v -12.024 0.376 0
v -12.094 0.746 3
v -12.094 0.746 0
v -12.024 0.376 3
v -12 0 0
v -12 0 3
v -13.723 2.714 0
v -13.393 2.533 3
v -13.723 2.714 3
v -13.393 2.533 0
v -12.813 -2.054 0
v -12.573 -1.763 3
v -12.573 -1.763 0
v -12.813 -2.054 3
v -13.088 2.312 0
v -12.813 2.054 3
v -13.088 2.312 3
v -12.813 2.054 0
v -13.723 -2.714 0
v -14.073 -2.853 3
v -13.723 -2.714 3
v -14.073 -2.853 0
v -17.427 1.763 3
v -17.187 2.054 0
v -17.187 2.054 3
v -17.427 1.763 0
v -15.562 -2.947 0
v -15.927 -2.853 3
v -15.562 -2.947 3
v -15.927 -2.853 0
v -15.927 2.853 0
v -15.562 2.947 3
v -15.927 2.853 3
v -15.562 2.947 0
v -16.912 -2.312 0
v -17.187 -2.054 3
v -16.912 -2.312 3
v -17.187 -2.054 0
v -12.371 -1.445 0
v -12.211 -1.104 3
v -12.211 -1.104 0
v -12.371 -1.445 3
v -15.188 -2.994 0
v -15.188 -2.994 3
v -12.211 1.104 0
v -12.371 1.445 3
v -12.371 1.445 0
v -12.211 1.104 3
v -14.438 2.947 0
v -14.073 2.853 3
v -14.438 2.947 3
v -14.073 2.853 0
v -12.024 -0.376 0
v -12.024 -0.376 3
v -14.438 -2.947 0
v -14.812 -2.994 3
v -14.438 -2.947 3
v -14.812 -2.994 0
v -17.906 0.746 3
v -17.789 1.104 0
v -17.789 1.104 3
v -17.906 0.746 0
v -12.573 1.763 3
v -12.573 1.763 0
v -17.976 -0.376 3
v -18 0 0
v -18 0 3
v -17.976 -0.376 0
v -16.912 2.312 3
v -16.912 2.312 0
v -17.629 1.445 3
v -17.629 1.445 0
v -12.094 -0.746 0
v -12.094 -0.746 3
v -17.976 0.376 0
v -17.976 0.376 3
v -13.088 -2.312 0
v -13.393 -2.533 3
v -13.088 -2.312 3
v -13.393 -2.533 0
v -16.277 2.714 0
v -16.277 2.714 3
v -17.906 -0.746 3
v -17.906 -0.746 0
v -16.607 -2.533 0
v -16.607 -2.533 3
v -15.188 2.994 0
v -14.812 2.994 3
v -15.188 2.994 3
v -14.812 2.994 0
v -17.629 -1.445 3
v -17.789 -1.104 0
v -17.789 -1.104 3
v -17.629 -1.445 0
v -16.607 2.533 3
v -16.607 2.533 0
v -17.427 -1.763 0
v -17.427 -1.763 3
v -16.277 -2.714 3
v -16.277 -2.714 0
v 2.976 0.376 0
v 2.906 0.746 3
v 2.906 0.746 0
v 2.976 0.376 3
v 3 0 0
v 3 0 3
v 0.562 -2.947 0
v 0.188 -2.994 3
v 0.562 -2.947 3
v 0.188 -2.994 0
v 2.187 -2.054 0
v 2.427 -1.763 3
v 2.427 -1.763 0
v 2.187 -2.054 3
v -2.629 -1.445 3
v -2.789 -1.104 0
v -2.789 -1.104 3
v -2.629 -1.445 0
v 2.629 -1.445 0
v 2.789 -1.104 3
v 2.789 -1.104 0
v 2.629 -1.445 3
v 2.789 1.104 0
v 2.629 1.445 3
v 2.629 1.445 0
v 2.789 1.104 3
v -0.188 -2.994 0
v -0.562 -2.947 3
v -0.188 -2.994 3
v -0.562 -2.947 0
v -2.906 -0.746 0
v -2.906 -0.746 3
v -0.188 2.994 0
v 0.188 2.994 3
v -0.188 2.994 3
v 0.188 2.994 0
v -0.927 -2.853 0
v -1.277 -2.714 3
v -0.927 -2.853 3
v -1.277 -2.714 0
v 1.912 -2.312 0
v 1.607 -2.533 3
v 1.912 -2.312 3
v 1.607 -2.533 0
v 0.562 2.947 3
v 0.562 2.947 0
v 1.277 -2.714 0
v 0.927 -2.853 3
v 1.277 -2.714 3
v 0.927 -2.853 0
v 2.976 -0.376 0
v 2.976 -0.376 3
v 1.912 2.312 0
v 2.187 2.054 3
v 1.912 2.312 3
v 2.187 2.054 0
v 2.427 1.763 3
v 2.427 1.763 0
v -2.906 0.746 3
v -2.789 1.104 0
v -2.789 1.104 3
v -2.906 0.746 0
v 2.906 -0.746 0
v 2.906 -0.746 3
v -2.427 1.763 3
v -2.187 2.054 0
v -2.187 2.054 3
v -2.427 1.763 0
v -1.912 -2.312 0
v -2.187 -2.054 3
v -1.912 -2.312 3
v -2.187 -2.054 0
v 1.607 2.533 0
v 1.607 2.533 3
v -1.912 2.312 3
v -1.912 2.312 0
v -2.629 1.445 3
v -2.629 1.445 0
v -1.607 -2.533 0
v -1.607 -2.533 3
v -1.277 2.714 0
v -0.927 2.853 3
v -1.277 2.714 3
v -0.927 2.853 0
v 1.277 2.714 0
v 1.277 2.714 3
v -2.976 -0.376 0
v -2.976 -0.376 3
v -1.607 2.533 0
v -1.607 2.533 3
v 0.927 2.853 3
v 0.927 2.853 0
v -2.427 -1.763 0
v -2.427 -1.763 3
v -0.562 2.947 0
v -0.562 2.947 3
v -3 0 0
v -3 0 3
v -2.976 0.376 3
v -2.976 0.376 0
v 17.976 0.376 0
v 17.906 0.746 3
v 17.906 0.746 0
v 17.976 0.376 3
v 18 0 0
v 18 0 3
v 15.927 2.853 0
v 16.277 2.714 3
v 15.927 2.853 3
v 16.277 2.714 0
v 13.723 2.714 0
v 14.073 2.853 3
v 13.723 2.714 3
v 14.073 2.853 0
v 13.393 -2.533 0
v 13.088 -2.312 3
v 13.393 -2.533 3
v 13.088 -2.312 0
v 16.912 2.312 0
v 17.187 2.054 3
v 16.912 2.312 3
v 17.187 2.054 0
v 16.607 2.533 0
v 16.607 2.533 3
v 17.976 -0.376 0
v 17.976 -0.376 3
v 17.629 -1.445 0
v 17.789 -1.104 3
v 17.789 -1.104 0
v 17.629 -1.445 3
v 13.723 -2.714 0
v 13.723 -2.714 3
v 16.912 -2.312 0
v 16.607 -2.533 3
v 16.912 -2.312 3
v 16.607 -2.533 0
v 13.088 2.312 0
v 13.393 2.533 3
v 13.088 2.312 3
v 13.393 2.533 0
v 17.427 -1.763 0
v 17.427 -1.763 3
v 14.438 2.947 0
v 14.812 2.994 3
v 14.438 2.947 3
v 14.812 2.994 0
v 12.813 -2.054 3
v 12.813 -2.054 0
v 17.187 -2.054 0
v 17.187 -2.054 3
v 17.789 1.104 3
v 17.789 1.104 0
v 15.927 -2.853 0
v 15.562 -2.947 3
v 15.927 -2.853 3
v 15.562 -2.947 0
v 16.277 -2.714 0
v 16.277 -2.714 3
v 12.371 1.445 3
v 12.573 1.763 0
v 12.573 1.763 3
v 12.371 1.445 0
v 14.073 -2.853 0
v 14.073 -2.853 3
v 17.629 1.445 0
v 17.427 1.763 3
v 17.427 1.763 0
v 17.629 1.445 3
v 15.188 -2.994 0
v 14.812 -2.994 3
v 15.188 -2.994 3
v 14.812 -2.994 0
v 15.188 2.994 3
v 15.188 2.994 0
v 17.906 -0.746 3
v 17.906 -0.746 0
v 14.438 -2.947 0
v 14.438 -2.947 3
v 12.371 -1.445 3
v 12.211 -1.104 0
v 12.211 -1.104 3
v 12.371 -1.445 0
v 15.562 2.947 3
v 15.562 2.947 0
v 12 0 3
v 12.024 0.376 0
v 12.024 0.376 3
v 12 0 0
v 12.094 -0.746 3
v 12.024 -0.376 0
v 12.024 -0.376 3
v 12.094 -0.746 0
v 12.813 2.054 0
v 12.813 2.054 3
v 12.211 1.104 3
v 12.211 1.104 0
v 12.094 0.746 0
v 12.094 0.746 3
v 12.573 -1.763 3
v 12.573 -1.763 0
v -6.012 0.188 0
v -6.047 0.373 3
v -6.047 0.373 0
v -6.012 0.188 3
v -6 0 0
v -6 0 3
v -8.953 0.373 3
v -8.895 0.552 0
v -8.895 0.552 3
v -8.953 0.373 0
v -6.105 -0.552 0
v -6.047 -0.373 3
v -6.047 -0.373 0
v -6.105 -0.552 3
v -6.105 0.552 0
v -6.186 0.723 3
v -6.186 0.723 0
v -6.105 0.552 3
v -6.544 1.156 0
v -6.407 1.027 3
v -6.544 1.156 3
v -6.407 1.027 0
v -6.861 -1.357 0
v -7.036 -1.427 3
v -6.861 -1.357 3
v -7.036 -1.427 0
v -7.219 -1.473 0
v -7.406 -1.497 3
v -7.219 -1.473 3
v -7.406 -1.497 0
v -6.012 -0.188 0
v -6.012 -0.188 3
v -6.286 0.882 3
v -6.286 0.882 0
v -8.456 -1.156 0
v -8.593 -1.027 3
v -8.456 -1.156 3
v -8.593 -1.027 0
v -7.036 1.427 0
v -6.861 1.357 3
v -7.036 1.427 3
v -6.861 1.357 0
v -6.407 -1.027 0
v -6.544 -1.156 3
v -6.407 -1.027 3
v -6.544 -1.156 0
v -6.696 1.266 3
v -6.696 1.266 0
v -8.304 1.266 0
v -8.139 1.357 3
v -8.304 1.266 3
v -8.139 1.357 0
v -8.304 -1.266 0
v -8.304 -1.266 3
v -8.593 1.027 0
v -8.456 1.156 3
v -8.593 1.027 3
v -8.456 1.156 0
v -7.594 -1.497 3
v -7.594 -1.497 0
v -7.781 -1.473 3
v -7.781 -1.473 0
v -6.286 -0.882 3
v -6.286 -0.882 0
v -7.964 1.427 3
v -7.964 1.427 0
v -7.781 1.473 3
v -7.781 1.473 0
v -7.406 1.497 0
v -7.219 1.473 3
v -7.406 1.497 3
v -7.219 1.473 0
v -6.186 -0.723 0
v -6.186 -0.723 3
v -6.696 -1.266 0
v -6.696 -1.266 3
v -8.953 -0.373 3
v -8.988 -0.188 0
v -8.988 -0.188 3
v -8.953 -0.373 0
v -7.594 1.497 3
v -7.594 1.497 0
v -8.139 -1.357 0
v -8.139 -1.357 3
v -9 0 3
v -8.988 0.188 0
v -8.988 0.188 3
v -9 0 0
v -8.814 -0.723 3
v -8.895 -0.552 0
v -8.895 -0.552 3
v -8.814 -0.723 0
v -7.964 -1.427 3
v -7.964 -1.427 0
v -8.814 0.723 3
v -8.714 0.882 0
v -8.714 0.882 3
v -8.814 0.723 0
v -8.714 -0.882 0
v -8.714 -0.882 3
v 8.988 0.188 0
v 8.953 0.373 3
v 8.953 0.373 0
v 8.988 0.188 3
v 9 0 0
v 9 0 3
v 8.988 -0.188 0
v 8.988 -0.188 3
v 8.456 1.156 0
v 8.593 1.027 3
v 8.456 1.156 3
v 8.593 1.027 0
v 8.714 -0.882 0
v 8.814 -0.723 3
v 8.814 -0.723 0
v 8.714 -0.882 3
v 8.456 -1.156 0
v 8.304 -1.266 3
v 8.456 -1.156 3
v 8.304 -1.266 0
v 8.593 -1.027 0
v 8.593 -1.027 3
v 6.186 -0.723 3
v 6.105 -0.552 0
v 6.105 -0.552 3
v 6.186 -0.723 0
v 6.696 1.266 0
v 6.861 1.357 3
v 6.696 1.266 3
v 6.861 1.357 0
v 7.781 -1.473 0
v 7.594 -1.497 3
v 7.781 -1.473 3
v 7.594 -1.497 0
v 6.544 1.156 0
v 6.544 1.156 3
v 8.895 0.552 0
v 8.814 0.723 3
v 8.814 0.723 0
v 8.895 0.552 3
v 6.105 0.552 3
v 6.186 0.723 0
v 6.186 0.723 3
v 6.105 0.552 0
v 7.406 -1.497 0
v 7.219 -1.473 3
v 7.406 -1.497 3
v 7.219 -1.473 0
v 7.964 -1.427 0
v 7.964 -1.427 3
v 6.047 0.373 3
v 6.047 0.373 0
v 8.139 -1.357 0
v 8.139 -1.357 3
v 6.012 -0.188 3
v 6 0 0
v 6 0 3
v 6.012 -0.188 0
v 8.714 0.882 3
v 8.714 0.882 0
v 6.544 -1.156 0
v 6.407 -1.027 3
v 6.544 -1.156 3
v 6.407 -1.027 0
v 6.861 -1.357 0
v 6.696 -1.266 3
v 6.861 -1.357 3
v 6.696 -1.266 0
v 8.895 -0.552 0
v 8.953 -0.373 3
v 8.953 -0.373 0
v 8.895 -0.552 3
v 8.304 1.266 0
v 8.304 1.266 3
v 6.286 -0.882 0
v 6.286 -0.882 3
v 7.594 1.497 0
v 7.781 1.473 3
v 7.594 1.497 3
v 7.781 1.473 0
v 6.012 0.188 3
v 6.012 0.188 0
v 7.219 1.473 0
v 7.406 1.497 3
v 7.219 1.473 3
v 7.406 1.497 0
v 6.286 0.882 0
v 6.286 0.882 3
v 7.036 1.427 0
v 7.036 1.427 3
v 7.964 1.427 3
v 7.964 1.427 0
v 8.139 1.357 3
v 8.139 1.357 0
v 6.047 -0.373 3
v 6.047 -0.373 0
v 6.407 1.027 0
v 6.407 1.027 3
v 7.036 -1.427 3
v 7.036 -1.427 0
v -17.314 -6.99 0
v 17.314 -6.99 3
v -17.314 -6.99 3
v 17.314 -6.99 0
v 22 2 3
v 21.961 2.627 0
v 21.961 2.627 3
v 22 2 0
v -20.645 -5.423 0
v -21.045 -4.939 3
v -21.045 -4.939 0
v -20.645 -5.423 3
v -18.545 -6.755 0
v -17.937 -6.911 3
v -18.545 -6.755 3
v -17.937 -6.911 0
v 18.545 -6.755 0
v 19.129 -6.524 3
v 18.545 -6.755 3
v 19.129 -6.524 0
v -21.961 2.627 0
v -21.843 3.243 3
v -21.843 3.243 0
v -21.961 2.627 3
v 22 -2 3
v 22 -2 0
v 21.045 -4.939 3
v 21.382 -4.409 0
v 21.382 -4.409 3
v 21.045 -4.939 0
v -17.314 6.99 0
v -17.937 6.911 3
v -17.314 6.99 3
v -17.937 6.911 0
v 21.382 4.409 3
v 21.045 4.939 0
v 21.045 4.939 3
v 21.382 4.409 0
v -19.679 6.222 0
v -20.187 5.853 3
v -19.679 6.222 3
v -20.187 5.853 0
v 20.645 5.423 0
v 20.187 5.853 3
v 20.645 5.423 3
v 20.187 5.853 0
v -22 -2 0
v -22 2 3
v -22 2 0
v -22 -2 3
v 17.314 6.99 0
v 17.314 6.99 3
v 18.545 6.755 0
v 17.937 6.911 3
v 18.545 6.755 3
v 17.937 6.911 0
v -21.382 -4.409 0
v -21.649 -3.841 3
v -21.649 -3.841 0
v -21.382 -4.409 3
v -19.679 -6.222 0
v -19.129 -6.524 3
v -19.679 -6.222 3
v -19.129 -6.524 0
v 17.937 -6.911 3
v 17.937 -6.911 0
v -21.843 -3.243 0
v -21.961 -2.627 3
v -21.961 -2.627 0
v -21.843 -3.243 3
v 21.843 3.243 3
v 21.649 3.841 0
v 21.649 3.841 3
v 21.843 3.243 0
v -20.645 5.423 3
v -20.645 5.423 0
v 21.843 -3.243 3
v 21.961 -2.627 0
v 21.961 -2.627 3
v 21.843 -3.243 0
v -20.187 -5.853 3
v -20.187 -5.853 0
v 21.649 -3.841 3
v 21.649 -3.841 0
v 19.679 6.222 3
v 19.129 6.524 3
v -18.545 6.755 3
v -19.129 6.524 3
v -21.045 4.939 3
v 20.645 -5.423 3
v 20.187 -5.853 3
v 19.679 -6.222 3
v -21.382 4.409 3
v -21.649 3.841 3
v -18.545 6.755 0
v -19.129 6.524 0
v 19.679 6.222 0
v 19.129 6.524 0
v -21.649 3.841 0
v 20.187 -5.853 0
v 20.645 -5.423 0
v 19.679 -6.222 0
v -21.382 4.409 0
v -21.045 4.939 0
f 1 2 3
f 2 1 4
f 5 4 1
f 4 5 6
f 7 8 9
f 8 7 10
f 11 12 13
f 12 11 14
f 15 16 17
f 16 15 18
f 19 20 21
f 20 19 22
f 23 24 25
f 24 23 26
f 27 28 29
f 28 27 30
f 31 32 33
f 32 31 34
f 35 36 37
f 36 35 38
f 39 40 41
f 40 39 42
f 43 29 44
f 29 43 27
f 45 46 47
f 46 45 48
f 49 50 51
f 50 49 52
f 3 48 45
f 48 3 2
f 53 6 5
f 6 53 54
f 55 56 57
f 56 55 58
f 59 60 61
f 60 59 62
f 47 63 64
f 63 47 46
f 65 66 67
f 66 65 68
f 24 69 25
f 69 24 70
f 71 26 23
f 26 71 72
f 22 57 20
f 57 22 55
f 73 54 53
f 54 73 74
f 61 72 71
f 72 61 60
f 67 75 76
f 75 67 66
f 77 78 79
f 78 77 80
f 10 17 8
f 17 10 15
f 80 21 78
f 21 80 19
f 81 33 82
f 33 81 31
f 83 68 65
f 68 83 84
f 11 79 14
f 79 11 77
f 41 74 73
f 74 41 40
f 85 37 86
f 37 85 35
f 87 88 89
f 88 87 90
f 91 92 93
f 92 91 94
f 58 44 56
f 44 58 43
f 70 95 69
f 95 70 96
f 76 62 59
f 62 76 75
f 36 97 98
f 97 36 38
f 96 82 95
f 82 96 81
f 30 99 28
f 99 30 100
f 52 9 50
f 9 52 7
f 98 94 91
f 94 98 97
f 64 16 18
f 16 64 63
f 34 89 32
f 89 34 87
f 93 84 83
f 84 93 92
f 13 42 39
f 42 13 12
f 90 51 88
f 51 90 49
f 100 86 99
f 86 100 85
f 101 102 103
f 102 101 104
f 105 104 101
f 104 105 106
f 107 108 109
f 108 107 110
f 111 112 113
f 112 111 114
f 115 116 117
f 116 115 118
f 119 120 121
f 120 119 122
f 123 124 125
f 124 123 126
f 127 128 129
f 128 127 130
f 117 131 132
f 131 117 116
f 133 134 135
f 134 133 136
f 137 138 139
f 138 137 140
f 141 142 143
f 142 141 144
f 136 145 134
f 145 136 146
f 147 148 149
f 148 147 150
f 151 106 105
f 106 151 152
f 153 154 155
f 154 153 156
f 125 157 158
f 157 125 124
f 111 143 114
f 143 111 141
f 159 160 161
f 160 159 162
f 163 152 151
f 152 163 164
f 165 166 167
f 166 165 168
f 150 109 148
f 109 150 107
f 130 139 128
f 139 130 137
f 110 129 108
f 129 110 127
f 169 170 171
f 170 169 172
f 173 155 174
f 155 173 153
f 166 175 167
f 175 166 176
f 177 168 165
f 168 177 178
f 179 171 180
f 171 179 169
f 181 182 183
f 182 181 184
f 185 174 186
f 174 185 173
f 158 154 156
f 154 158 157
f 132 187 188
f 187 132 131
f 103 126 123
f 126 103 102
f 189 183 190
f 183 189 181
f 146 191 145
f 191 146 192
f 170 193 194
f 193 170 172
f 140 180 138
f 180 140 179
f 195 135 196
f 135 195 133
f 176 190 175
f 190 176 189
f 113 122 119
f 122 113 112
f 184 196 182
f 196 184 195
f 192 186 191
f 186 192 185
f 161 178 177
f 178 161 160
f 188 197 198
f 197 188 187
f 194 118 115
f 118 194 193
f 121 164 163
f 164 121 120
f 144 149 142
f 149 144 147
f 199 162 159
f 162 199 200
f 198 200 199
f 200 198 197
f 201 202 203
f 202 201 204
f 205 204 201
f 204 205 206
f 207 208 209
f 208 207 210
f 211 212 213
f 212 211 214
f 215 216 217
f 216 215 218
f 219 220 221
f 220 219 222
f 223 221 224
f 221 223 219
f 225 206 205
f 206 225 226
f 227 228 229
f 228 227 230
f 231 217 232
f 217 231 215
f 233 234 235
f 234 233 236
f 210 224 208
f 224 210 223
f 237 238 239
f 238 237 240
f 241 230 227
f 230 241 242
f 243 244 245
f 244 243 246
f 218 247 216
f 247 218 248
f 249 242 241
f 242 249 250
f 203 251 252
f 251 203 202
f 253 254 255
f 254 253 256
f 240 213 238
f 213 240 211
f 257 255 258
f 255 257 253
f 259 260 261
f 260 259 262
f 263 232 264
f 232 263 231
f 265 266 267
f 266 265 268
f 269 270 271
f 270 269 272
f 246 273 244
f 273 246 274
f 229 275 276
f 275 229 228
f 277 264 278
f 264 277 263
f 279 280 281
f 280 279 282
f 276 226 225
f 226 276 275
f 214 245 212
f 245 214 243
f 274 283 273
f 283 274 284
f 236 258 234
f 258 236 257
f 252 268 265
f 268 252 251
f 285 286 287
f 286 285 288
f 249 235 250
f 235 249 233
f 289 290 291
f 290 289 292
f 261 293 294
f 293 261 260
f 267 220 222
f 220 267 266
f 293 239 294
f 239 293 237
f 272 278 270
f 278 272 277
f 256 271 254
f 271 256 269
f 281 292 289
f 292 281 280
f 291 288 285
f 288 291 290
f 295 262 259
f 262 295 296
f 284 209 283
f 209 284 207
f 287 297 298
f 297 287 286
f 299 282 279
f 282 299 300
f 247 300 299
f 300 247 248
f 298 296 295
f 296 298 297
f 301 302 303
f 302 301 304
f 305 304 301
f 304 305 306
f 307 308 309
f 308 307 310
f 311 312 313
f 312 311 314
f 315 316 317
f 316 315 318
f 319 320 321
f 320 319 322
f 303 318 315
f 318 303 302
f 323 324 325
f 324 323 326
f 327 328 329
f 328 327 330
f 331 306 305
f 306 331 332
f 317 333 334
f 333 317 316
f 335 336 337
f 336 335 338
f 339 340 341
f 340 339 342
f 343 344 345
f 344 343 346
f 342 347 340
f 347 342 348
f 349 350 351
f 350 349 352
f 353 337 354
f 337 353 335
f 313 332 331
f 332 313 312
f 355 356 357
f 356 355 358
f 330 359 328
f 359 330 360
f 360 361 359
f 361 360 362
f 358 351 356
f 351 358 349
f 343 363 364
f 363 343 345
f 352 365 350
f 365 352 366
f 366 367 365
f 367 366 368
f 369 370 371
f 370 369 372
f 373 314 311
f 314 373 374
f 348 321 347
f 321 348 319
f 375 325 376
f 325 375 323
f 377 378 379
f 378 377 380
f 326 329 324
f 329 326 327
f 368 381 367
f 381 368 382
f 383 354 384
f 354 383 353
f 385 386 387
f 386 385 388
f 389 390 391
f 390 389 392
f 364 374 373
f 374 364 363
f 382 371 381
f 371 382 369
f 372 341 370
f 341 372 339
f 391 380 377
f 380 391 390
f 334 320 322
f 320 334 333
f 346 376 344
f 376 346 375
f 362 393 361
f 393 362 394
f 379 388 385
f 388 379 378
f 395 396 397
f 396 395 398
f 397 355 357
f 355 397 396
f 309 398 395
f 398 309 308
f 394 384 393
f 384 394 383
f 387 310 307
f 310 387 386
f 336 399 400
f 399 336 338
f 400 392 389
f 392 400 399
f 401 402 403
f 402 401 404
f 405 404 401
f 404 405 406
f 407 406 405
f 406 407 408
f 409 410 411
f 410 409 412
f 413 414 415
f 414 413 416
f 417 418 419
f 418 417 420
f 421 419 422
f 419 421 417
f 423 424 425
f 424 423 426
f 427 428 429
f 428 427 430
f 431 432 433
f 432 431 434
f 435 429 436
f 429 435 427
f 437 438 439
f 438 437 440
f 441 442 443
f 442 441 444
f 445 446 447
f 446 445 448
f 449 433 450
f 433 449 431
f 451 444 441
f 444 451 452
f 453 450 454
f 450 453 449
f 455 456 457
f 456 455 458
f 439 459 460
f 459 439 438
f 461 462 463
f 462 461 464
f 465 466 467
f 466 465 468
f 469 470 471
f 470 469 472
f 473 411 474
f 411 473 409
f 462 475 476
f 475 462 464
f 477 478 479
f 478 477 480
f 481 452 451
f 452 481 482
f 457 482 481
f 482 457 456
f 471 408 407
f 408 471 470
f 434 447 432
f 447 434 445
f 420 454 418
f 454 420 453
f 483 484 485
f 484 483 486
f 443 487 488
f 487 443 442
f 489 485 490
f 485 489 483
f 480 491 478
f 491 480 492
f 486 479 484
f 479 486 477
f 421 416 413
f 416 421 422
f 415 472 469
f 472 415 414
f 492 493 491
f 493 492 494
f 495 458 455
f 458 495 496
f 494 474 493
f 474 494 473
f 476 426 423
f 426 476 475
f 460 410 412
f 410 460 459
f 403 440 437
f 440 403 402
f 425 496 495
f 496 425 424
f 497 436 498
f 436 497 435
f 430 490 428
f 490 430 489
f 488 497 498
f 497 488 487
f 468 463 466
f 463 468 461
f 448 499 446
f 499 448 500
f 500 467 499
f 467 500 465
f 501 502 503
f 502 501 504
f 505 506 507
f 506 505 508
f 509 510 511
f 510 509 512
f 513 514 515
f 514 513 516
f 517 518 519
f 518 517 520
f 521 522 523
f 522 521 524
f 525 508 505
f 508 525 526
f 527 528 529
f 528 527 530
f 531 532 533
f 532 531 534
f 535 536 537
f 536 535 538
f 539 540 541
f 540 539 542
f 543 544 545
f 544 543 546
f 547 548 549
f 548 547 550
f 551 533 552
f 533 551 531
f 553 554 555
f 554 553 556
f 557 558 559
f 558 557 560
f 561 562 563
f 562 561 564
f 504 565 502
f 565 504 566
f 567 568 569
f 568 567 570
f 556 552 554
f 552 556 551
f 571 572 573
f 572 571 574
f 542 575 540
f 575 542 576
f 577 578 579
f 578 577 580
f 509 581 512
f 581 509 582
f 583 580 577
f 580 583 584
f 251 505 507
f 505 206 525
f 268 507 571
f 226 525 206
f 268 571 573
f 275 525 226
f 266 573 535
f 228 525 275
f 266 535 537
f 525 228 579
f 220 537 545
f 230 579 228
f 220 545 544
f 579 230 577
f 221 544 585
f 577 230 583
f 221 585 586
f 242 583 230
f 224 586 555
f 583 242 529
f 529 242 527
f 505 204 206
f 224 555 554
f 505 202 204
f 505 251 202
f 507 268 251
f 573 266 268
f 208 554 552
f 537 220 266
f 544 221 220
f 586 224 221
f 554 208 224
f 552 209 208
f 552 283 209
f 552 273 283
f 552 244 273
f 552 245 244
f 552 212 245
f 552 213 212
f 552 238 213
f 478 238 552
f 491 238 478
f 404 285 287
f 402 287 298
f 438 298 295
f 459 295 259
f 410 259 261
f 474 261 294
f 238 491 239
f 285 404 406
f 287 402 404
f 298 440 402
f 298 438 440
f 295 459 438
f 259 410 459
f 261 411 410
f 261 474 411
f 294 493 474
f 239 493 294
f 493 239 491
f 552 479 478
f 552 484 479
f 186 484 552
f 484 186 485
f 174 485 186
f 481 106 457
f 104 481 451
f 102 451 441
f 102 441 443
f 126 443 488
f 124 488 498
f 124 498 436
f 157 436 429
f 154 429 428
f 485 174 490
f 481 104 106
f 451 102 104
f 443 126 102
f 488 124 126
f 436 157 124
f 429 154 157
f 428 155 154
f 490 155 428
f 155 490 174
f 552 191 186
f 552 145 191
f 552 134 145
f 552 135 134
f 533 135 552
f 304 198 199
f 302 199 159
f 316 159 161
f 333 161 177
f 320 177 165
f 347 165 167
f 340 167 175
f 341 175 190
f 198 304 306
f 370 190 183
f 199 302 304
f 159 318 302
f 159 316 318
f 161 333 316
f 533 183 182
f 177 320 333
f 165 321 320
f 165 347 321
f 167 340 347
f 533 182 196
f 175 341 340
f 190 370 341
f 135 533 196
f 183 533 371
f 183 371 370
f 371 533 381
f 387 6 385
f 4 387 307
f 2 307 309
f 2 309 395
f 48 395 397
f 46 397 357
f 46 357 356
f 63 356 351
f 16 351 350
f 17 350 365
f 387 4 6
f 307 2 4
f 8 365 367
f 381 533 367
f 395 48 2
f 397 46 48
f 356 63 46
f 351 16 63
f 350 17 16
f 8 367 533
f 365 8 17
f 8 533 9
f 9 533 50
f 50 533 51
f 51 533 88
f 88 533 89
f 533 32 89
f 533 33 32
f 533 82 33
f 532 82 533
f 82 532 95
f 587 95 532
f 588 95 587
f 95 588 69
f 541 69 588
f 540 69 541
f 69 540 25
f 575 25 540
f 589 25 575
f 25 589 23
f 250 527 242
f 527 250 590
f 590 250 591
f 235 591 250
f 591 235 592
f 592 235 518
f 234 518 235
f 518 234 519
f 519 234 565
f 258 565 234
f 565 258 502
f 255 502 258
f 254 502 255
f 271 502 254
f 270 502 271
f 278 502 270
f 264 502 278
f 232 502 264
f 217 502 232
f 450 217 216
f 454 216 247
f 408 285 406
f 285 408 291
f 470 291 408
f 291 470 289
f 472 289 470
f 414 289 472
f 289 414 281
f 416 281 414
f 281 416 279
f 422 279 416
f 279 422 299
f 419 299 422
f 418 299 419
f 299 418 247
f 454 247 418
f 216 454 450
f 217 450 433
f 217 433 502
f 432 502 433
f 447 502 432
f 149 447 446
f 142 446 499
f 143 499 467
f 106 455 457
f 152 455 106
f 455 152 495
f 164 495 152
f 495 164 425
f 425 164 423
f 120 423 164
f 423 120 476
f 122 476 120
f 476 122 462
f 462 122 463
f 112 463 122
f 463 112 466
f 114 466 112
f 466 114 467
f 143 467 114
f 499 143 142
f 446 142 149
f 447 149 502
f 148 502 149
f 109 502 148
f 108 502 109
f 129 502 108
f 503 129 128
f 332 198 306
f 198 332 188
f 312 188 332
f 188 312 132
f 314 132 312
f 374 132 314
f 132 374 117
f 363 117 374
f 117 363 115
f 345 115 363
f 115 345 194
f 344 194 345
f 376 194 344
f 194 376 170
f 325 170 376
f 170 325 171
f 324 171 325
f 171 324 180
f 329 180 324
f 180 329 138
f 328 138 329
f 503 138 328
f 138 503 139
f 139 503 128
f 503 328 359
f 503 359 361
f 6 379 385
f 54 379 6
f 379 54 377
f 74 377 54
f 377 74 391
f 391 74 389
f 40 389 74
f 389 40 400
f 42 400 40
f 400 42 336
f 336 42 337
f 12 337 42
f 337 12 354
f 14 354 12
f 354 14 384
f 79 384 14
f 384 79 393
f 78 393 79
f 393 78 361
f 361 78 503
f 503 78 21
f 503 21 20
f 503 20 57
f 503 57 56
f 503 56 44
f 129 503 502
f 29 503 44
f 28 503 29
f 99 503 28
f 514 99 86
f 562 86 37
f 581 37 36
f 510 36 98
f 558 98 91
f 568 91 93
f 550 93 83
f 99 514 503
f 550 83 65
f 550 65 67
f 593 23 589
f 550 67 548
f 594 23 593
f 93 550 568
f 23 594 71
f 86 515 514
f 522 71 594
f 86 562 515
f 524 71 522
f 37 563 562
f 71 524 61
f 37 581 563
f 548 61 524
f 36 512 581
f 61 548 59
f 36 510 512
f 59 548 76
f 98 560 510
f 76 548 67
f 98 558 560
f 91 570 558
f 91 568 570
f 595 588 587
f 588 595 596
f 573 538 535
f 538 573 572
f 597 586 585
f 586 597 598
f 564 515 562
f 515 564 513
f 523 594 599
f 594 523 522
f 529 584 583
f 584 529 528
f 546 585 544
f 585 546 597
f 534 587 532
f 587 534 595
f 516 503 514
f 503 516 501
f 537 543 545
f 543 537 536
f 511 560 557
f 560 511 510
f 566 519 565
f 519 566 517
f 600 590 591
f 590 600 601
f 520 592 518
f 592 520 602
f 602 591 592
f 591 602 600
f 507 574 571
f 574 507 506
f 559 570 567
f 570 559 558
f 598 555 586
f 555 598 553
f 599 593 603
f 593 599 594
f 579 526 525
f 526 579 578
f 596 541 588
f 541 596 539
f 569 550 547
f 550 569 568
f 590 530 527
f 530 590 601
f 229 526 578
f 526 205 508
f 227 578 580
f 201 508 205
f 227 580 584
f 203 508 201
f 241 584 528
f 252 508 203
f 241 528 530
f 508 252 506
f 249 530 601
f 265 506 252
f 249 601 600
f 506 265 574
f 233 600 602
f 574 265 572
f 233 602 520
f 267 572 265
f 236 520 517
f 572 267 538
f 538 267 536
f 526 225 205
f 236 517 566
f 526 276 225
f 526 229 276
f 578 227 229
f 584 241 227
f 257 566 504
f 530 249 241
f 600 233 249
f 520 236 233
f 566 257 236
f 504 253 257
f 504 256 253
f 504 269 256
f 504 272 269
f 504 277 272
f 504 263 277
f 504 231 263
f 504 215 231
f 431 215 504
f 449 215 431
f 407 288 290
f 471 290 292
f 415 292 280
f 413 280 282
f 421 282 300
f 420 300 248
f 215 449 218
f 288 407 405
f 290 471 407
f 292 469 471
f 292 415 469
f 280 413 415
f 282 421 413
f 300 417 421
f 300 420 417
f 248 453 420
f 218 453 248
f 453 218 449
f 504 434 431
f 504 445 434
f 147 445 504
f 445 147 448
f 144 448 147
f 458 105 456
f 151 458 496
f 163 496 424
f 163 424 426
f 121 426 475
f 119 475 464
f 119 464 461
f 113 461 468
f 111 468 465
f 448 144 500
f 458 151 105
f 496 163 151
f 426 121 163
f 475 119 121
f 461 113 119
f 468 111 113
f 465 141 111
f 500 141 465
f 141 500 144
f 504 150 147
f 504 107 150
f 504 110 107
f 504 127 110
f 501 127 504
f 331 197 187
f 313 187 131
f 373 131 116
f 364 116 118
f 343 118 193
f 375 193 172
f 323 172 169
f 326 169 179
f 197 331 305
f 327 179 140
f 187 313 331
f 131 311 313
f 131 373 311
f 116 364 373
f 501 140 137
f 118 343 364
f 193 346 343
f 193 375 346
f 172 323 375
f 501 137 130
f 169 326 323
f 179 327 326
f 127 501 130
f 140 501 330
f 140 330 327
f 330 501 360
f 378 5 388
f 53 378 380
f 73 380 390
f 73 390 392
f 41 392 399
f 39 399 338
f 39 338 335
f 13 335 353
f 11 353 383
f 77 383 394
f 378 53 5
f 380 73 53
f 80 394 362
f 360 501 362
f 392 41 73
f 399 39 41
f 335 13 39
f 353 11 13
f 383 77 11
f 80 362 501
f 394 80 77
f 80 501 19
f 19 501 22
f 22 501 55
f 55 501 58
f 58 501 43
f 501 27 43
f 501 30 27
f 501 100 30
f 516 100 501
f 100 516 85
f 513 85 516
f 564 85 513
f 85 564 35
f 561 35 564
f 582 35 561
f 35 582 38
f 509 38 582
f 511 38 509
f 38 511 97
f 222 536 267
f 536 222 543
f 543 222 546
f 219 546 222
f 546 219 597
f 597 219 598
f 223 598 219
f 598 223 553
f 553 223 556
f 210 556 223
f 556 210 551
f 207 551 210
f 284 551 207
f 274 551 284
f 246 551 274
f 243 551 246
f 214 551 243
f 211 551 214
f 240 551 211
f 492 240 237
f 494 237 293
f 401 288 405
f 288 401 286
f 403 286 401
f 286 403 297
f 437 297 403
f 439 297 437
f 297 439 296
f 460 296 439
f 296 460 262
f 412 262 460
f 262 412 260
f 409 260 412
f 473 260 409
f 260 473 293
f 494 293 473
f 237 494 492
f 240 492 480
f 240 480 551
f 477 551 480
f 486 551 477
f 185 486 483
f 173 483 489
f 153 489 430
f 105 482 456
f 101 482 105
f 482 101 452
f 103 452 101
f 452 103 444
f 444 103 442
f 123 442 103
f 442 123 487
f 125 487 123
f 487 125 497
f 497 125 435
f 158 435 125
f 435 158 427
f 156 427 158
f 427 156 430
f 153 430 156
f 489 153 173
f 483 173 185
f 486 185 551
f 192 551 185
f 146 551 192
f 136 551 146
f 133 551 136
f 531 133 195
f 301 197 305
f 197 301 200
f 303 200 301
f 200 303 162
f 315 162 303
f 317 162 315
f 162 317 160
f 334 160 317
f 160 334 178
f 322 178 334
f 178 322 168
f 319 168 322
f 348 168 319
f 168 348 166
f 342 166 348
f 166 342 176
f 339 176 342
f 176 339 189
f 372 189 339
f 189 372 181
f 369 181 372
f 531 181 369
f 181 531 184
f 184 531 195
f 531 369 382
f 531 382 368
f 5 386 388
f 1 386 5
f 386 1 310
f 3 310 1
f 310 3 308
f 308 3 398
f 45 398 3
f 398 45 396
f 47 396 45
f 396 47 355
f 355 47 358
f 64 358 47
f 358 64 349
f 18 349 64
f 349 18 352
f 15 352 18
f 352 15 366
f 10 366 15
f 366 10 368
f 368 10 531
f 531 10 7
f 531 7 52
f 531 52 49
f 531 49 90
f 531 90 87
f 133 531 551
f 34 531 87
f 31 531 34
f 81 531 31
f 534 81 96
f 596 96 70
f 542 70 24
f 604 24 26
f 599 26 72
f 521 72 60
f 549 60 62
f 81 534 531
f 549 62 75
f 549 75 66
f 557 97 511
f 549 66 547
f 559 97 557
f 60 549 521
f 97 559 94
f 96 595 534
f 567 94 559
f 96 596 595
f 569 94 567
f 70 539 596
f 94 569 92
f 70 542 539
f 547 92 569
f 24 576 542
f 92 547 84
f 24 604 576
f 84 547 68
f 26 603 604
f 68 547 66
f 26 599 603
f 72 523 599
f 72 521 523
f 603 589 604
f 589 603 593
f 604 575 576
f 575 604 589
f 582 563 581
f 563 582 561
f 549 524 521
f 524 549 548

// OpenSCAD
$fn = 50;


difference() {
	union() {
		hull() {
			translate(v = [-17.0000000000, 2.0000000000, 0]) {
				cylinder(h = 3, r = 5);
			}
			translate(v = [17.0000000000, 2.0000000000, 0]) {
				cylinder(h = 3, r = 5);
			}
			translate(v = [-17.0000000000, -2.0000000000, 0]) {
				cylinder(h = 3, r = 5);
			}
			translate(v = [17.0000000000, -2.0000000000, 0]) {
				cylinder(h = 3, r = 5);
			}
		}
	}
	union() {
		translate(v = [-15.0000000000, 0.0000000000, 0]) {
			translate(v = [0, 0, -100]) {
				cylinder(h = 200, r = 3.0000000000);
			}
		}
		translate(v = [0, 0, -100]) {
			cylinder(h = 200, r = 3.0000000000);
		}
		translate(v = [15.0000000000, 0.0000000000, 0]) {
			translate(v = [0, 0, -100]) {
				cylinder(h = 200, r = 3.0000000000);
			}
		}
		translate(v = [-15.0000000000, 0.0000000000, 0]) {
			translate(v = [0, 0, -100]) {
				cylinder(h = 200, r = 1.5000000000);
			}
		}
		translate(v = [-7.5000000000, 0.0000000000, 0]) {
			translate(v = [0, 0, -100]) {
				cylinder(h = 200, r = 1.5000000000);
			}
		}
		translate(v = [0, 0, -100]) {
			cylinder(h = 200, r = 1.5000000000);
		}
		translate(v = [7.5000000000, 0.0000000000, 0]) {
			translate(v = [0, 0, -100]) {
				cylinder(h = 200, r = 1.5000000000);
			}
		}
		translate(v = [15.0000000000, 0.0000000000, 0]) {
			translate(v = [0, 0, -100]) {
				cylinder(h = 200, r = 1.5000000000);
			}
		}
	}
}
